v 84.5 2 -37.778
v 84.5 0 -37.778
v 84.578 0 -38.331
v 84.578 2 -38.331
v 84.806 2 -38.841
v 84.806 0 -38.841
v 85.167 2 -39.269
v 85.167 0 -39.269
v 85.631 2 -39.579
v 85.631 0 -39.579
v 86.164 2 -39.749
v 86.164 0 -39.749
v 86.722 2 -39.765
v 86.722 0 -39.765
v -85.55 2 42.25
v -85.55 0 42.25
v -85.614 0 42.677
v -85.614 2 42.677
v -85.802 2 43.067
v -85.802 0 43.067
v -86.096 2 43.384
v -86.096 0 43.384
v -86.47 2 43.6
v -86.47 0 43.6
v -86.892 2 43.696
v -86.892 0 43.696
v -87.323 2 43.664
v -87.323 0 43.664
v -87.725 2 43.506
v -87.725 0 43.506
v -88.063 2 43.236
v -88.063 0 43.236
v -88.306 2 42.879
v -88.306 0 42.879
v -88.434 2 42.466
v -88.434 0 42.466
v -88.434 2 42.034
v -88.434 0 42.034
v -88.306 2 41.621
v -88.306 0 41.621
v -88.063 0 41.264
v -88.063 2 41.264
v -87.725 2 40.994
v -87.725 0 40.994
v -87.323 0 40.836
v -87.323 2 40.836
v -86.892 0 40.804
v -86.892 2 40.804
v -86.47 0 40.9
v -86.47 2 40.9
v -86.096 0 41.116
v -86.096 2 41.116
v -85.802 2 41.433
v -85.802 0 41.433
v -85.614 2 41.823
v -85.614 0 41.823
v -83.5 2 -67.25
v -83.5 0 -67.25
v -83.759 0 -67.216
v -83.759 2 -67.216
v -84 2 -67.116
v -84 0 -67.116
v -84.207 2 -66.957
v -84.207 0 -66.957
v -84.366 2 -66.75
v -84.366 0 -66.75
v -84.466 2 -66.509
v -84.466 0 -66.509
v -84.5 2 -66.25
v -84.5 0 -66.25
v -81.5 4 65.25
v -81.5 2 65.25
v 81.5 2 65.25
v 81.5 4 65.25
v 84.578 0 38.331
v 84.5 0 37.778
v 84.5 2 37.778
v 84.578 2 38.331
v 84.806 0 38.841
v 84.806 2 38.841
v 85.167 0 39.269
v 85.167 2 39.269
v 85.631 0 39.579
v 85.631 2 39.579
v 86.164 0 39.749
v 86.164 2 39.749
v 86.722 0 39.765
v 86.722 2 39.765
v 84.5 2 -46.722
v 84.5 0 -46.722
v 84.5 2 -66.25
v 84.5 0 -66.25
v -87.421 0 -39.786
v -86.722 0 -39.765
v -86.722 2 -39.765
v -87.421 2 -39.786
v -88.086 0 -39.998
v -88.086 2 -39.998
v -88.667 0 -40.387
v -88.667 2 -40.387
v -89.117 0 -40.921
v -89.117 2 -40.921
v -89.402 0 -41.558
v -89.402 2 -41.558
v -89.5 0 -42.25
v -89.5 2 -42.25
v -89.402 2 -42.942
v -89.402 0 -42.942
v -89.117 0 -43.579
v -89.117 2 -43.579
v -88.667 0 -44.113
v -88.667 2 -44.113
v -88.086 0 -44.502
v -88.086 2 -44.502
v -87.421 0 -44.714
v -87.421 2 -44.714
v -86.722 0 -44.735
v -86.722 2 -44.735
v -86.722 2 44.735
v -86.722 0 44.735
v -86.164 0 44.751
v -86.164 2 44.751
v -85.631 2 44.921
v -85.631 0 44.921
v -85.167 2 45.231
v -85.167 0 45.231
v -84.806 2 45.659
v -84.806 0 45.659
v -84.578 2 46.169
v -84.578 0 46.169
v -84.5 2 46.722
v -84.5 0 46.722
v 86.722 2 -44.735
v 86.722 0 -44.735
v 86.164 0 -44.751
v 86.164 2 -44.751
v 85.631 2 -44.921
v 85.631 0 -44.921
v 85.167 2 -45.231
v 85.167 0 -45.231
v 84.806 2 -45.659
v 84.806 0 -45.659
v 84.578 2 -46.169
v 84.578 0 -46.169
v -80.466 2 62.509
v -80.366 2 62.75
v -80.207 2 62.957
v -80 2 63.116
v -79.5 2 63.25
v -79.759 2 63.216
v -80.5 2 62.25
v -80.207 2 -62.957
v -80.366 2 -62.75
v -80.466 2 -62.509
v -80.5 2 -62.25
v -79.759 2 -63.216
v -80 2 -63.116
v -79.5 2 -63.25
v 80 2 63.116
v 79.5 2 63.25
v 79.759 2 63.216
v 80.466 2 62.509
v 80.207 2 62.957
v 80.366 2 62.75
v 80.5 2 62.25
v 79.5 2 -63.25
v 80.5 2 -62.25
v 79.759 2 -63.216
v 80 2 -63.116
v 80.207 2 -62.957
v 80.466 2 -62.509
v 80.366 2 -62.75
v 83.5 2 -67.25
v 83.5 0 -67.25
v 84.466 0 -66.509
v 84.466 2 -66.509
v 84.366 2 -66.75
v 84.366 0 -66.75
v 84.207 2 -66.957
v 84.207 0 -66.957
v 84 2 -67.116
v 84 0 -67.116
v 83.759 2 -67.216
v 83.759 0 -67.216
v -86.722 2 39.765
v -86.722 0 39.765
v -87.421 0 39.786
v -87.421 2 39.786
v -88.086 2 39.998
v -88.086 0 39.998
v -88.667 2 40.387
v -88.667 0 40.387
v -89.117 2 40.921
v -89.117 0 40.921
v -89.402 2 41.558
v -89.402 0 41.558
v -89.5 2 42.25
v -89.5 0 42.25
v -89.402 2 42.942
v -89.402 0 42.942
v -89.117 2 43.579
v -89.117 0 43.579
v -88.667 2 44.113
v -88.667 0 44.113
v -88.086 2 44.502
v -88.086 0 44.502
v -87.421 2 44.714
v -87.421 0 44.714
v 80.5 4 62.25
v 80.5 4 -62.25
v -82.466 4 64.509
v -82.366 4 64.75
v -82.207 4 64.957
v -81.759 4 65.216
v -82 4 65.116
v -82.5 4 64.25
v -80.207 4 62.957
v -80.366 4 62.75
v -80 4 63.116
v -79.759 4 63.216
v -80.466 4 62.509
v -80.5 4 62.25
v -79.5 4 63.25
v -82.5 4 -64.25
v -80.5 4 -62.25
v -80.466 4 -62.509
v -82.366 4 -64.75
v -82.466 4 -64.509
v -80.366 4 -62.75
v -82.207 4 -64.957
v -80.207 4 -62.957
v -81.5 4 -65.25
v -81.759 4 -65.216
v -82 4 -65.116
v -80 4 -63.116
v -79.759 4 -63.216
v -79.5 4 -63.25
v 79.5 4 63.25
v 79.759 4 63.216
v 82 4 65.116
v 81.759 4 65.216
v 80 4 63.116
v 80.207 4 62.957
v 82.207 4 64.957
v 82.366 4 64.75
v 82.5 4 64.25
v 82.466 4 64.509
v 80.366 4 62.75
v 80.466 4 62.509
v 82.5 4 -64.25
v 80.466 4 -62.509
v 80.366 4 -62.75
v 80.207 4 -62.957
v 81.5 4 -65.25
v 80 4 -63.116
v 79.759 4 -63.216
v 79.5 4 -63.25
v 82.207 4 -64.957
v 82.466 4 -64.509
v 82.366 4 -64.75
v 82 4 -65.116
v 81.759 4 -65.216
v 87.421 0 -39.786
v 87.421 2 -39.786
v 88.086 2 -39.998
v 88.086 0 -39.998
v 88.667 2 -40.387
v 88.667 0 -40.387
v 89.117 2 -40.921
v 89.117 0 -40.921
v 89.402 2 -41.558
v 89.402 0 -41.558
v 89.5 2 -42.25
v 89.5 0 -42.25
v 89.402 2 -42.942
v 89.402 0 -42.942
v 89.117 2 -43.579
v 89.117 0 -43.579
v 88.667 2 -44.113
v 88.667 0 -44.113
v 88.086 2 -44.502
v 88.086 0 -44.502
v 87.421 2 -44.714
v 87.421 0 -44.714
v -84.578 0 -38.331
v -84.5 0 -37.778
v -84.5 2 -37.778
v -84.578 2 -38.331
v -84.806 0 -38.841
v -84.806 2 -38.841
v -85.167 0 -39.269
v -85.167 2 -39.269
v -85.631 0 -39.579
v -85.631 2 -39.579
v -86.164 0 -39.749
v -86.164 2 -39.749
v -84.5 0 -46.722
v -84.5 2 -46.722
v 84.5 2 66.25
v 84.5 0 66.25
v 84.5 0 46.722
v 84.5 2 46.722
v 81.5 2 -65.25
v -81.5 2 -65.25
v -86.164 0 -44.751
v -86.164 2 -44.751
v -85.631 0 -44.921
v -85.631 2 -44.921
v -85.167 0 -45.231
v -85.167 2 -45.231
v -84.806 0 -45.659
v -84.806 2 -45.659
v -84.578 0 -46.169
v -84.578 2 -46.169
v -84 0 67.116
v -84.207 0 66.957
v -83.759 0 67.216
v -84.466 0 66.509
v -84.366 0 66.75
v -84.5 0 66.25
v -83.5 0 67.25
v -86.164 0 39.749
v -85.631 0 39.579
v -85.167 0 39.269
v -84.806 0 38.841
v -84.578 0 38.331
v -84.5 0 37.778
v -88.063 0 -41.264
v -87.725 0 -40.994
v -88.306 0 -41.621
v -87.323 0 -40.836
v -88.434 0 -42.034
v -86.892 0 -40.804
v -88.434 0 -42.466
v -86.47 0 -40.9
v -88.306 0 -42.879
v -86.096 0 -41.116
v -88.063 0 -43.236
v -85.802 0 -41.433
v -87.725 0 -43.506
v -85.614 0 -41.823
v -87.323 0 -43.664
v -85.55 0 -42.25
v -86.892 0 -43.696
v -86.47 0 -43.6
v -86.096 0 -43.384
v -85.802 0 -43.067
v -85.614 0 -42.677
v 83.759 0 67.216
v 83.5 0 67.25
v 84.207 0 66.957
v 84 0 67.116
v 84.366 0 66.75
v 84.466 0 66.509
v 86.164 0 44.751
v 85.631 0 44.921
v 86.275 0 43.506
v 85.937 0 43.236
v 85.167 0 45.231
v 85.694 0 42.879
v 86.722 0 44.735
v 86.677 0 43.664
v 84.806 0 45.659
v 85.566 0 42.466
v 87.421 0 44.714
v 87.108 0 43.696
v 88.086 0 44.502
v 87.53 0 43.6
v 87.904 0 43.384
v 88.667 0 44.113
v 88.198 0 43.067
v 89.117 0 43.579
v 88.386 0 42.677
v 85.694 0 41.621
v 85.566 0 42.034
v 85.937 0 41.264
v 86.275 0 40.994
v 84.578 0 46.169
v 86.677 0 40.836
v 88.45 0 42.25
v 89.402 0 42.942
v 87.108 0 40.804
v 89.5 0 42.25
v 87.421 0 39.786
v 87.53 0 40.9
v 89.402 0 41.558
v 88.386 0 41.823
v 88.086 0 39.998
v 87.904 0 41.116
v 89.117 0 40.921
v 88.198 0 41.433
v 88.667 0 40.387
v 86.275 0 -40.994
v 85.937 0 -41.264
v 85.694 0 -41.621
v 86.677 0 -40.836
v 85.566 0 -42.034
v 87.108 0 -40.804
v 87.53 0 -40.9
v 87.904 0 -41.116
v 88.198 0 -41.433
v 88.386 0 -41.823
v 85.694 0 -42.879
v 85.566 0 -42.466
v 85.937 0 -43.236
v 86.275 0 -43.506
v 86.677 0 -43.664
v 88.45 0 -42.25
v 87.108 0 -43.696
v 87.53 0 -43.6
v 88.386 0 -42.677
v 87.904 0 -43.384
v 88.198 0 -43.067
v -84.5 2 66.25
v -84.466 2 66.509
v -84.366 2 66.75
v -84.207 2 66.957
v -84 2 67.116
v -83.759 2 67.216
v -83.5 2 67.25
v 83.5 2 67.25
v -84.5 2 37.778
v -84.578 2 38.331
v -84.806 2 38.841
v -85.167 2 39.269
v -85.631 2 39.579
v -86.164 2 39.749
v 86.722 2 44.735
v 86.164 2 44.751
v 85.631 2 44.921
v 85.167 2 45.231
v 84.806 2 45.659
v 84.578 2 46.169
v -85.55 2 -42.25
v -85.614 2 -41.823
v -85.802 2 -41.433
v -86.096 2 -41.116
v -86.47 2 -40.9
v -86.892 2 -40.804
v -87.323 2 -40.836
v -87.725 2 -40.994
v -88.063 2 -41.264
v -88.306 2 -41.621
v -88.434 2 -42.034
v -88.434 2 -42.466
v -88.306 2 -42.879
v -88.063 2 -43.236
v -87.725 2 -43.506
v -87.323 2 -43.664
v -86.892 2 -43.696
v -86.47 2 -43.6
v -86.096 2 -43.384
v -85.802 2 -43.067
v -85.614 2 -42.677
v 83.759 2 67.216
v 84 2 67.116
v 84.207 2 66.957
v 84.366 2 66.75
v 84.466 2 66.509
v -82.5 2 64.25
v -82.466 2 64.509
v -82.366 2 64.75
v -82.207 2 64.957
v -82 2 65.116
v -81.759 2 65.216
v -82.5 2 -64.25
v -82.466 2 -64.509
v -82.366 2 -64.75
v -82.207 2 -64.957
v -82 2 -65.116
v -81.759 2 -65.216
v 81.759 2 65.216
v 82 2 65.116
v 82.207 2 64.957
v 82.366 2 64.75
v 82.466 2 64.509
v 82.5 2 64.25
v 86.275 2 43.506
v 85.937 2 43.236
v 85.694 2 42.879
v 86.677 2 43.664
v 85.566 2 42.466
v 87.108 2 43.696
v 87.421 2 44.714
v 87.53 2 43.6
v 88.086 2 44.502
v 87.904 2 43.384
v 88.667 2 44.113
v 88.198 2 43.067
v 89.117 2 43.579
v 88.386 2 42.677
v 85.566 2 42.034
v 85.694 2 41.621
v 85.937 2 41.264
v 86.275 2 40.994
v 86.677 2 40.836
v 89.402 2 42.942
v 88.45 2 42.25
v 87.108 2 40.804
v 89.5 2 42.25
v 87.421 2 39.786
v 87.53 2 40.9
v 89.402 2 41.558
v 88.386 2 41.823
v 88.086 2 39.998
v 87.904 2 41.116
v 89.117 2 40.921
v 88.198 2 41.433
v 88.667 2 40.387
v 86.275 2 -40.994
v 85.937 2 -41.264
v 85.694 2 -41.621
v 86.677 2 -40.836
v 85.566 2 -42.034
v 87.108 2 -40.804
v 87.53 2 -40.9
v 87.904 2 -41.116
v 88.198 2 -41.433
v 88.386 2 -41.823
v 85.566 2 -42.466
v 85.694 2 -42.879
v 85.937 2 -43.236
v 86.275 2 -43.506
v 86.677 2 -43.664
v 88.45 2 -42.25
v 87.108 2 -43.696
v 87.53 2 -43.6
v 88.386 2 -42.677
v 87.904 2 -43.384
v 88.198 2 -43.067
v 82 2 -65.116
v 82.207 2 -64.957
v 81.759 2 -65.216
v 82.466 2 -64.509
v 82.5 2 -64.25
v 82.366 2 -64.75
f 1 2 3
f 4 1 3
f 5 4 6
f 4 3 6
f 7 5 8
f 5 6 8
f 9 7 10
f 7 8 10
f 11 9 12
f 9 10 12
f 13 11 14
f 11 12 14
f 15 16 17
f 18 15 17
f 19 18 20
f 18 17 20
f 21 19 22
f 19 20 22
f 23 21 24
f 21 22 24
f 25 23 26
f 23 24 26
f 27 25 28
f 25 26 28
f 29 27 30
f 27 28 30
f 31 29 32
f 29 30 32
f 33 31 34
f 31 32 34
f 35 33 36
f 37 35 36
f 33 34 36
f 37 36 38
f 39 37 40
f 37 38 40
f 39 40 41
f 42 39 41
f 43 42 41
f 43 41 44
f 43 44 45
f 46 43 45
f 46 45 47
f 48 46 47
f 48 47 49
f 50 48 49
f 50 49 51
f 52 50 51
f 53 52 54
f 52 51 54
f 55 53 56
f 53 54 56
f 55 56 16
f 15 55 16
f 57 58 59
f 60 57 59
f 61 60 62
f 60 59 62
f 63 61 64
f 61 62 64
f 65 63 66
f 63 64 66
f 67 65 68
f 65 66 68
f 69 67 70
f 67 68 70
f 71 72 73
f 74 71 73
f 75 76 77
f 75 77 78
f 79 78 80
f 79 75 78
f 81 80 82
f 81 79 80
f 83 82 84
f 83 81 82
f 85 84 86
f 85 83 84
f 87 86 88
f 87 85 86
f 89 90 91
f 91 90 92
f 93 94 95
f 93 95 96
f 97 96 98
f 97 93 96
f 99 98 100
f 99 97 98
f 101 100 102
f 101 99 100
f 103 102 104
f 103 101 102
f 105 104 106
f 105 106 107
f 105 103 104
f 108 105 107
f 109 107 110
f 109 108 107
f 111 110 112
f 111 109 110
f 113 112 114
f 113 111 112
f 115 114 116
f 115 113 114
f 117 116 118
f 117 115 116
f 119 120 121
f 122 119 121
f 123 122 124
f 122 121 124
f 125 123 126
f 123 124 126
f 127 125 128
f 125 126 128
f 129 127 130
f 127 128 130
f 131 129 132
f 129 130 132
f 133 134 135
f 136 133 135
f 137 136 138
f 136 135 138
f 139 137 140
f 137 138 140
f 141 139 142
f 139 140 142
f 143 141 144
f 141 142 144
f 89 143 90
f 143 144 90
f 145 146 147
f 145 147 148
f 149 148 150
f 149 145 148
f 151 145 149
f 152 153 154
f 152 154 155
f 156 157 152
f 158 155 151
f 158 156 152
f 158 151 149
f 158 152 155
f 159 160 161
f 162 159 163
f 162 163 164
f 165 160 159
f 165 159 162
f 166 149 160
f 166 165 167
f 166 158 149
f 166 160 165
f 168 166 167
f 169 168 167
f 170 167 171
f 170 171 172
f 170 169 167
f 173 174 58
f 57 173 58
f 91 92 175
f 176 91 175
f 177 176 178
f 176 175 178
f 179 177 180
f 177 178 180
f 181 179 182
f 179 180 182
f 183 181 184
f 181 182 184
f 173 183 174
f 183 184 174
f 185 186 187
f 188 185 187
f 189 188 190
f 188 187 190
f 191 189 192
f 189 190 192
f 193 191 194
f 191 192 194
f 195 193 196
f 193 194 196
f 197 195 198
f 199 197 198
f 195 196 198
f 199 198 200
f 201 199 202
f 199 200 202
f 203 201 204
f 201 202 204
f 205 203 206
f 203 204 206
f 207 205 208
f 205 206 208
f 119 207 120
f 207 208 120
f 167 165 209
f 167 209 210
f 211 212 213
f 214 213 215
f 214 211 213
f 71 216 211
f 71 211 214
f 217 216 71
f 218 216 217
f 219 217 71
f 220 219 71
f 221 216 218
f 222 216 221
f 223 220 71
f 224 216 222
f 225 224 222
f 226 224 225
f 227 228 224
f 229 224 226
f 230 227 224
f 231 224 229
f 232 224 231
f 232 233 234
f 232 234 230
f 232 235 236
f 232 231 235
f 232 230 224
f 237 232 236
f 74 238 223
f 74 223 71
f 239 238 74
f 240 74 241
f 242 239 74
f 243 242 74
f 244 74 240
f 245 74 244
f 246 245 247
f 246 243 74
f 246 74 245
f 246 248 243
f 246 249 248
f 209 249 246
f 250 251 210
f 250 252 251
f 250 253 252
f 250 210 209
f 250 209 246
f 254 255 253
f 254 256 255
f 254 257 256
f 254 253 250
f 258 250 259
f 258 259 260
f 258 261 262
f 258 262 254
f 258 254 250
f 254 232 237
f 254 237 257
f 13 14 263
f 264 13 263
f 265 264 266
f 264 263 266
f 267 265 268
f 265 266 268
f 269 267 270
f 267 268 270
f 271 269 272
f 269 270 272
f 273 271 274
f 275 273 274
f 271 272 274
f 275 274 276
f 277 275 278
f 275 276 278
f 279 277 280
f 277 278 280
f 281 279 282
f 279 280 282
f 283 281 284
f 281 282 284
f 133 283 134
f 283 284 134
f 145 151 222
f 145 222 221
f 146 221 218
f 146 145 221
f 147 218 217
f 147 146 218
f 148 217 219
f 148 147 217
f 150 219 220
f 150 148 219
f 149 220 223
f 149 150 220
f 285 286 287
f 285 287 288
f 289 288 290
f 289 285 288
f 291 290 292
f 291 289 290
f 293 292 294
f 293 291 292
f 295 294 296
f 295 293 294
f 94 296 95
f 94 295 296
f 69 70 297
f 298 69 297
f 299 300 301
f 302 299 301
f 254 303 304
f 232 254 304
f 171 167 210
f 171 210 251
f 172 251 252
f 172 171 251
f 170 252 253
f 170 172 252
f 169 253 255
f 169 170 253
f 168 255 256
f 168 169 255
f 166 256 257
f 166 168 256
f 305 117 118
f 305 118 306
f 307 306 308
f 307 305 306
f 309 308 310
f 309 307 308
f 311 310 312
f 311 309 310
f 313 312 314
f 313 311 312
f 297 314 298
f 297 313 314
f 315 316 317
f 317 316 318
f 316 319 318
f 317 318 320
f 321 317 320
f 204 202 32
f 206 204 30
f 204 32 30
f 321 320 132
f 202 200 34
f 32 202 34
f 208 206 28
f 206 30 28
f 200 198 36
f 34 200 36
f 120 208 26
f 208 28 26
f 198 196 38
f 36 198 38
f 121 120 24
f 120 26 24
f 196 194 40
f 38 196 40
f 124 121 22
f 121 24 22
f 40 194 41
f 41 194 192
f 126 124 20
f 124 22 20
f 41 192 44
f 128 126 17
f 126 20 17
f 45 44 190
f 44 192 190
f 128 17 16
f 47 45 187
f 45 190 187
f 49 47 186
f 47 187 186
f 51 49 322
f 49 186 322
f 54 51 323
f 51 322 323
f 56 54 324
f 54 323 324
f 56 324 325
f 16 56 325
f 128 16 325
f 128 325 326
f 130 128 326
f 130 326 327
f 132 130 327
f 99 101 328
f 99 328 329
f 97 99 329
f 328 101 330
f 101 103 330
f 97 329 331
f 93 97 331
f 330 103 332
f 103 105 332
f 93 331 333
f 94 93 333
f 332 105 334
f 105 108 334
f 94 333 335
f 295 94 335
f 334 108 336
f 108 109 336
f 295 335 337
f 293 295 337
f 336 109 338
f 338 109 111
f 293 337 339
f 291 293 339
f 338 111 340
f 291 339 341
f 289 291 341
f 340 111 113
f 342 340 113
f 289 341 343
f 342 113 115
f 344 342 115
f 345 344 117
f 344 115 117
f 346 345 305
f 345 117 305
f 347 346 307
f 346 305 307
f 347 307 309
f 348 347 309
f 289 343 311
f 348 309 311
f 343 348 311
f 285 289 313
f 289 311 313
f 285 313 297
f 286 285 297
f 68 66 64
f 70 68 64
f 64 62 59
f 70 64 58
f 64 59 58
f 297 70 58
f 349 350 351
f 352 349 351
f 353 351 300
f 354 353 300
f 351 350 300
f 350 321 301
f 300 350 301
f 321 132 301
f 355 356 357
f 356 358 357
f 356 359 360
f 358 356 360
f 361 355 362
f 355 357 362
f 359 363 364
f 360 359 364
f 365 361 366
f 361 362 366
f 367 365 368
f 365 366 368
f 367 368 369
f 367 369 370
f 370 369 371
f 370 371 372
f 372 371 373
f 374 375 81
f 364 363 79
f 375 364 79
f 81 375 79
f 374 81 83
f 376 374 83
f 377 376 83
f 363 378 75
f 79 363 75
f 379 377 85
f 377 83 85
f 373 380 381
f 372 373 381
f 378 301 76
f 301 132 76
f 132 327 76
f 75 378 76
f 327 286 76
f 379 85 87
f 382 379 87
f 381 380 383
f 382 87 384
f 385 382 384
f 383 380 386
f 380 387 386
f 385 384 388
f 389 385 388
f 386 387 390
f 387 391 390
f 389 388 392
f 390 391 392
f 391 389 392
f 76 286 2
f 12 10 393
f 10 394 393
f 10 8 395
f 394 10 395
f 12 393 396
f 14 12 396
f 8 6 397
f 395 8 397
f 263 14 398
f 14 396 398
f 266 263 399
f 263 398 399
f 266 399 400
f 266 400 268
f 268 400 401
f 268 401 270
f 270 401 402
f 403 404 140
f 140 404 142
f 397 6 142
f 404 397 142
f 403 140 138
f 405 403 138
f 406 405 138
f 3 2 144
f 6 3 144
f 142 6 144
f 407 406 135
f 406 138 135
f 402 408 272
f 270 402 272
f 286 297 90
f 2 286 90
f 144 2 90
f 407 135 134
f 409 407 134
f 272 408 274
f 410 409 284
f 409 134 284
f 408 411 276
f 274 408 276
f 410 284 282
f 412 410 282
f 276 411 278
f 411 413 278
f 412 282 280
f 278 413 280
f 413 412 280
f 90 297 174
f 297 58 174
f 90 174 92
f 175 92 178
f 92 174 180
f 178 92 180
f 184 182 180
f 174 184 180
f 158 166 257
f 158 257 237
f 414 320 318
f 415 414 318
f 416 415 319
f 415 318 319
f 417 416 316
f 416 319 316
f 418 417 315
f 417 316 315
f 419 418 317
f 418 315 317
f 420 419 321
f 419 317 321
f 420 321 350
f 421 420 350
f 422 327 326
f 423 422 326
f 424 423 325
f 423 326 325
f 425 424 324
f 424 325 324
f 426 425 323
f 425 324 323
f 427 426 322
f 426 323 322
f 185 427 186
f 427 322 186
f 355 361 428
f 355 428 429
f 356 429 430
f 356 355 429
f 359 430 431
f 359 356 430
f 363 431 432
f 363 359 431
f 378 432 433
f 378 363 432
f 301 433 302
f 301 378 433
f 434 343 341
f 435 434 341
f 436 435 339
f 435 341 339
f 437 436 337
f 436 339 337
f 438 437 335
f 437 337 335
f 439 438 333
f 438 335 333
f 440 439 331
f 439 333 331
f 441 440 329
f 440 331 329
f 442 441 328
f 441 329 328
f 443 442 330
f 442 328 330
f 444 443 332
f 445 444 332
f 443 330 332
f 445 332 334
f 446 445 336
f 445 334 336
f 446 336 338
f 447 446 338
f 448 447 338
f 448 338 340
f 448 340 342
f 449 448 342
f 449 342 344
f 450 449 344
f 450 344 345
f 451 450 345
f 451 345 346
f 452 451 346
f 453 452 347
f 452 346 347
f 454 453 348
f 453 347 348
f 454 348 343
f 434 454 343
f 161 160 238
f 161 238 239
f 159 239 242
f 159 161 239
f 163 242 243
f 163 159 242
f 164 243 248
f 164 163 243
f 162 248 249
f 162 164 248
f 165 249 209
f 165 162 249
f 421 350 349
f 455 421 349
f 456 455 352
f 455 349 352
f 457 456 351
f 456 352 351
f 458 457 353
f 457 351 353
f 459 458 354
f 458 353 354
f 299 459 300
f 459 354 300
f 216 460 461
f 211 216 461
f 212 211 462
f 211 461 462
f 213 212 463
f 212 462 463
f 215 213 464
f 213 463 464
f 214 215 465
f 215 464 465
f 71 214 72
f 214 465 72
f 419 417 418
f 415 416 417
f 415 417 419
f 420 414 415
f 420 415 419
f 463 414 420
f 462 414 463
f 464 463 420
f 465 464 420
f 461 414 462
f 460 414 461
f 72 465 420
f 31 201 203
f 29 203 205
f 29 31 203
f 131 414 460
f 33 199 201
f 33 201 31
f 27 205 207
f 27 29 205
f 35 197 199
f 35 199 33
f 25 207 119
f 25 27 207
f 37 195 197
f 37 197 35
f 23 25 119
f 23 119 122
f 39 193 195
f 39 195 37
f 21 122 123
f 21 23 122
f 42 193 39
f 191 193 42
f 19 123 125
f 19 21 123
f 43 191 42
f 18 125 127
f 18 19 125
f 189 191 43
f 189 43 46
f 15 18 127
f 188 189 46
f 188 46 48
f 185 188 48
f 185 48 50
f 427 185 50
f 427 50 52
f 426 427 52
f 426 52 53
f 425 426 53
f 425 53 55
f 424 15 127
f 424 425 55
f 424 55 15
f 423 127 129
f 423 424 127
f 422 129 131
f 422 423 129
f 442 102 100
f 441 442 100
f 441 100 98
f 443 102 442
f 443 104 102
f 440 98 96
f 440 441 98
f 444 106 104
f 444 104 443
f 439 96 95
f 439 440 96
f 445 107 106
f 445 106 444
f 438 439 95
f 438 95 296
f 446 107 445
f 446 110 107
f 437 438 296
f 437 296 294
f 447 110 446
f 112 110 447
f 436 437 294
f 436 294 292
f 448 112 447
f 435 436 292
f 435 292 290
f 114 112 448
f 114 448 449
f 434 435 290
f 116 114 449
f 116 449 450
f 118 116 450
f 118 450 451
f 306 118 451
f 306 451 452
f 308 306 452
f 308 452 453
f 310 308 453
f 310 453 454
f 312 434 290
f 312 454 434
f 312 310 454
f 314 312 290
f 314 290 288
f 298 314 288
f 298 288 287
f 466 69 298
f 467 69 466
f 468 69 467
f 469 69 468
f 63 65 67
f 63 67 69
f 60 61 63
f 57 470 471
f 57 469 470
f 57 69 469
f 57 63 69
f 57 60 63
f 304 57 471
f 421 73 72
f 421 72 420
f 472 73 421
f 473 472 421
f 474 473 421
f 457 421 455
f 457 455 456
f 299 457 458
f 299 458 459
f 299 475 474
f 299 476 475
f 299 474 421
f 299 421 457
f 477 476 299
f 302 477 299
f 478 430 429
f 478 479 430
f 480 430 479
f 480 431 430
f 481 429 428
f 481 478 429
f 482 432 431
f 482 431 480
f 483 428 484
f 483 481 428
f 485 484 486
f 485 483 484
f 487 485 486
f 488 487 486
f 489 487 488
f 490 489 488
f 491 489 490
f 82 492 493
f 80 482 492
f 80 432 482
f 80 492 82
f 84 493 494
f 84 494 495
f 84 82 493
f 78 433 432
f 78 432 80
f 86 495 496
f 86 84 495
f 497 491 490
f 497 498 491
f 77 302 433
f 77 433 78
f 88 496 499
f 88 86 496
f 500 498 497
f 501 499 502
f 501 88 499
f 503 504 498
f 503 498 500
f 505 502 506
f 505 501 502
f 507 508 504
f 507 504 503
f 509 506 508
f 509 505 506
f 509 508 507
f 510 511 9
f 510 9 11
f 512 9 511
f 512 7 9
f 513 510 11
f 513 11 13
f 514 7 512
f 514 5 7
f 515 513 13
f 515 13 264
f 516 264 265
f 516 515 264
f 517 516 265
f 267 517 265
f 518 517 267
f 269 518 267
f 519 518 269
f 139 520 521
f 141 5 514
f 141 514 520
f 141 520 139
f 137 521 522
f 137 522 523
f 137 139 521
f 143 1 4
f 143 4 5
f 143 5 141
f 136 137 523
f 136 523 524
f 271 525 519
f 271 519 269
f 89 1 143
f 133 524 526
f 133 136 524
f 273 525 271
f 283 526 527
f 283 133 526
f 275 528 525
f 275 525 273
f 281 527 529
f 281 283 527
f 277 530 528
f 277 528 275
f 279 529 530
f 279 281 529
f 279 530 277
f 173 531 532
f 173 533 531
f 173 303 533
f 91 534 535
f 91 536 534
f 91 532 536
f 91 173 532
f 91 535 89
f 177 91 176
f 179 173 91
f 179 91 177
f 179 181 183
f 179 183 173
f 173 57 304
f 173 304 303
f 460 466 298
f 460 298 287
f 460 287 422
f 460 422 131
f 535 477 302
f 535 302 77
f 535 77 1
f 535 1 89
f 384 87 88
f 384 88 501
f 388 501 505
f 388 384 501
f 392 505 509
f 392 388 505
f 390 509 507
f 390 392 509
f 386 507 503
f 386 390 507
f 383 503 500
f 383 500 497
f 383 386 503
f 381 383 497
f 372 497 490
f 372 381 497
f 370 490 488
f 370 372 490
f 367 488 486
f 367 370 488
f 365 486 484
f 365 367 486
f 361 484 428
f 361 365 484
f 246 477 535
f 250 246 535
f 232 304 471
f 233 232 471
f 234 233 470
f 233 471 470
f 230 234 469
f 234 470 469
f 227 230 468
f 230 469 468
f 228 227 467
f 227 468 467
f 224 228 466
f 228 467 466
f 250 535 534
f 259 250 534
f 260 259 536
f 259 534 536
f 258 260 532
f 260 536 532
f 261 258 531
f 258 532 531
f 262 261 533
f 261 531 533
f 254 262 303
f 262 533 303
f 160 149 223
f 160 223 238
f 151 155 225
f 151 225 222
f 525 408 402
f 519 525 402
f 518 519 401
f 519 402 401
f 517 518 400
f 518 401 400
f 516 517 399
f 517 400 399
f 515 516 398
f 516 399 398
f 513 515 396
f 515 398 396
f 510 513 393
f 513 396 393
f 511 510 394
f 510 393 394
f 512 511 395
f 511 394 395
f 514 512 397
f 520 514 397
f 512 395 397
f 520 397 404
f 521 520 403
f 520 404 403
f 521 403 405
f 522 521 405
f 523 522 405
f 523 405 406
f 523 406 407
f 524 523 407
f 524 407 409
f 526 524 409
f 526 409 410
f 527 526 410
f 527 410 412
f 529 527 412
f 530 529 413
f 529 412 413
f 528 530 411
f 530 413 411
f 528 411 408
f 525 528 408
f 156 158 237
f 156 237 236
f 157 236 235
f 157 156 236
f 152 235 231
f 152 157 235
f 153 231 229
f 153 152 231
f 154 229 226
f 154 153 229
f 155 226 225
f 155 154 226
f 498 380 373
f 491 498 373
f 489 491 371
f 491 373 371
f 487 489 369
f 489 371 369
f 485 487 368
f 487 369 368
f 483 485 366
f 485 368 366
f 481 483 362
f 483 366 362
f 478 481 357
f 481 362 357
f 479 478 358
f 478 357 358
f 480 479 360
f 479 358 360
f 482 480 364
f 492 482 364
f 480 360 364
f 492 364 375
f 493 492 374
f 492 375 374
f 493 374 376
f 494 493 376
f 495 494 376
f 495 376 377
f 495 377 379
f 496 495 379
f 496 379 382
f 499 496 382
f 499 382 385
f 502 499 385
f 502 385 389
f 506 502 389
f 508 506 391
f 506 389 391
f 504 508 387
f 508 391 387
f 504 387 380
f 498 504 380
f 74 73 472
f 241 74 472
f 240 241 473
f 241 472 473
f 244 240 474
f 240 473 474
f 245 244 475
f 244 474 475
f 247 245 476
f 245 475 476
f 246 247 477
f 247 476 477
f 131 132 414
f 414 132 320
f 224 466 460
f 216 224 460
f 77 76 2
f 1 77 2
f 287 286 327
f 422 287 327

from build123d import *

# Parameters (mm, degrees)
EXTRUDE_1_DEPTH = 2
EXTRUDE_2_DEPTH = 2
SKETCH_3_R      = 1.45
EXTRUDE_5_DEPTH = 2


with BuildPart() as part:
    # 草图1 → 凸台-拉伸1 (new body)
    with BuildSketch(Plane(origin=(0, 0, 0), x_dir=(1, 0, 0), z_dir=(0, 1, 0))):
        with BuildLine():
            Line((-83.5, -67.25), (83.5, -67.25))
            ThreePointArc((83.5, -67.25), (84.207106781, -66.957106781), (84.5, -66.25))
            Line((84.5, -66.25), (84.5, 66.25))
            ThreePointArc((84.5, 66.25), (84.207106781, 66.957106781), (83.5, 67.25))
            Line((83.5, 67.25), (-83.5, 67.25))
            ThreePointArc((-83.5, 67.25), (-84.207106781, 66.957106781), (-84.5, 66.25))
            Line((-84.5, 66.25), (-84.5, -66.25))
            ThreePointArc((-84.5, -66.25), (-84.207106781, -66.957106781), (-83.5, -67.25))
        make_face()
    extrude(amount=EXTRUDE_1_DEPTH)

    # 草图2 → 凸台-拉伸2 (add)
    with BuildSketch(Plane(origin=(0, 2, 0), x_dir=(1, 0, 0), z_dir=(0, 1, 0))):
        with BuildLine():
            Line((-81.5, -65.25), (81.5, -65.25))
            ThreePointArc((81.5, -65.25), (82.207106781, -64.957106781), (82.5, -64.25))
            Line((82.5, -64.25), (82.5, 64.25))
            ThreePointArc((82.5, 64.25), (82.207106781, 64.957106781), (81.5, 65.25))
            Line((81.5, 65.25), (-81.5, 65.25))
            ThreePointArc((-81.5, 65.25), (-82.207106781, 64.957106781), (-82.5, 64.25))
            Line((-82.5, 64.25), (-82.5, -64.25))
            ThreePointArc((-82.5, -64.25), (-82.207106781, -64.957106781), (-81.5, -65.25))
        make_face()
        with BuildLine():
            Line((79.5, 63.25), (-79.5, 63.25))
            ThreePointArc((-79.5, 63.25), (-80.207106781, 62.957106781), (-80.5, 62.25))
            Line((-80.5, 62.25), (-80.5, -62.25))
            ThreePointArc((-80.5, -62.25), (-80.207106781, -62.957106781), (-79.5, -63.25))
            Line((-79.5, -63.25), (79.5, -63.25))
            ThreePointArc((79.5, -63.25), (80.207106781, -62.957106781), (80.5, -62.25))
            Line((80.5, -62.25), (80.5, 62.25))
            ThreePointArc((80.5, 62.25), (80.207106781, 62.957106781), (79.5, 63.25))
        make_face(mode=Mode.SUBTRACT)
    extrude(amount=EXTRUDE_2_DEPTH)

    # 草图3 → 凸台-拉伸5 (add)
    with BuildSketch(Plane.XZ):
        with BuildLine():
            Line((-84.5, 46.722135955), (-84.5, 37.777864045))
            ThreePointArc((-84.5, 37.777864045), (-85.166666667, 39.26857603), (-86.722222222, 39.765480025))
            ThreePointArc((-86.722222222, 39.765480025), (-89.5, 42.25), (-86.722222222, 44.734519975))
            ThreePointArc((-86.722222222, 44.734519975), (-85.166666667, 45.23142397), (-84.5, 46.722135955))
        make_face()
        with Locations((-87, 42.25)):
            Circle(SKETCH_3_R, mode=Mode.SUBTRACT)
        with BuildLine():
            Line((84.5, 46.722135955), (84.5, 37.777864045))
            ThreePointArc((84.5, 37.777864045), (85.166666667, 39.26857603), (86.722222222, 39.765480025))
            ThreePointArc((86.722222222, 39.765480025), (89.5, 42.25), (86.722222222, 44.734519975))
            ThreePointArc((86.722222222, 44.734519975), (85.166666667, 45.23142397), (84.5, 46.722135955))
        make_face()
        with Locations((87, 42.25)):
            Circle(SKETCH_3_R, mode=Mode.SUBTRACT)
        with BuildLine():
            Line((84.5, -46.722135955), (84.5, -37.777864045))
            ThreePointArc((84.5, -37.777864045), (85.166666667, -39.26857603), (86.722222222, -39.765480025))
            ThreePointArc((86.722222222, -39.765480025), (89.5, -42.25), (86.722222222, -44.734519975))
            ThreePointArc((86.722222222, -44.734519975), (85.166666667, -45.23142397), (84.5, -46.722135955))
        make_face()
        with Locations((87, -42.25)):
            Circle(SKETCH_3_R, mode=Mode.SUBTRACT)
        with BuildLine():
            Line((-84.5, -46.722135955), (-84.5, -37.777864045))
            ThreePointArc((-84.5, -37.777864045), (-85.166666667, -39.26857603), (-86.722222222, -39.765480025))
            ThreePointArc((-86.722222222, -39.765480025), (-89.5, -42.25), (-86.722222222, -44.734519975))
            ThreePointArc((-86.722222222, -44.734519975), (-85.166666667, -45.23142397), (-84.5, -46.722135955))
        make_face()
        with Locations((-87, -42.25)):
            Circle(SKETCH_3_R, mode=Mode.SUBTRACT)
    extrude(amount=-EXTRUDE_5_DEPTH)


solid = part.part
